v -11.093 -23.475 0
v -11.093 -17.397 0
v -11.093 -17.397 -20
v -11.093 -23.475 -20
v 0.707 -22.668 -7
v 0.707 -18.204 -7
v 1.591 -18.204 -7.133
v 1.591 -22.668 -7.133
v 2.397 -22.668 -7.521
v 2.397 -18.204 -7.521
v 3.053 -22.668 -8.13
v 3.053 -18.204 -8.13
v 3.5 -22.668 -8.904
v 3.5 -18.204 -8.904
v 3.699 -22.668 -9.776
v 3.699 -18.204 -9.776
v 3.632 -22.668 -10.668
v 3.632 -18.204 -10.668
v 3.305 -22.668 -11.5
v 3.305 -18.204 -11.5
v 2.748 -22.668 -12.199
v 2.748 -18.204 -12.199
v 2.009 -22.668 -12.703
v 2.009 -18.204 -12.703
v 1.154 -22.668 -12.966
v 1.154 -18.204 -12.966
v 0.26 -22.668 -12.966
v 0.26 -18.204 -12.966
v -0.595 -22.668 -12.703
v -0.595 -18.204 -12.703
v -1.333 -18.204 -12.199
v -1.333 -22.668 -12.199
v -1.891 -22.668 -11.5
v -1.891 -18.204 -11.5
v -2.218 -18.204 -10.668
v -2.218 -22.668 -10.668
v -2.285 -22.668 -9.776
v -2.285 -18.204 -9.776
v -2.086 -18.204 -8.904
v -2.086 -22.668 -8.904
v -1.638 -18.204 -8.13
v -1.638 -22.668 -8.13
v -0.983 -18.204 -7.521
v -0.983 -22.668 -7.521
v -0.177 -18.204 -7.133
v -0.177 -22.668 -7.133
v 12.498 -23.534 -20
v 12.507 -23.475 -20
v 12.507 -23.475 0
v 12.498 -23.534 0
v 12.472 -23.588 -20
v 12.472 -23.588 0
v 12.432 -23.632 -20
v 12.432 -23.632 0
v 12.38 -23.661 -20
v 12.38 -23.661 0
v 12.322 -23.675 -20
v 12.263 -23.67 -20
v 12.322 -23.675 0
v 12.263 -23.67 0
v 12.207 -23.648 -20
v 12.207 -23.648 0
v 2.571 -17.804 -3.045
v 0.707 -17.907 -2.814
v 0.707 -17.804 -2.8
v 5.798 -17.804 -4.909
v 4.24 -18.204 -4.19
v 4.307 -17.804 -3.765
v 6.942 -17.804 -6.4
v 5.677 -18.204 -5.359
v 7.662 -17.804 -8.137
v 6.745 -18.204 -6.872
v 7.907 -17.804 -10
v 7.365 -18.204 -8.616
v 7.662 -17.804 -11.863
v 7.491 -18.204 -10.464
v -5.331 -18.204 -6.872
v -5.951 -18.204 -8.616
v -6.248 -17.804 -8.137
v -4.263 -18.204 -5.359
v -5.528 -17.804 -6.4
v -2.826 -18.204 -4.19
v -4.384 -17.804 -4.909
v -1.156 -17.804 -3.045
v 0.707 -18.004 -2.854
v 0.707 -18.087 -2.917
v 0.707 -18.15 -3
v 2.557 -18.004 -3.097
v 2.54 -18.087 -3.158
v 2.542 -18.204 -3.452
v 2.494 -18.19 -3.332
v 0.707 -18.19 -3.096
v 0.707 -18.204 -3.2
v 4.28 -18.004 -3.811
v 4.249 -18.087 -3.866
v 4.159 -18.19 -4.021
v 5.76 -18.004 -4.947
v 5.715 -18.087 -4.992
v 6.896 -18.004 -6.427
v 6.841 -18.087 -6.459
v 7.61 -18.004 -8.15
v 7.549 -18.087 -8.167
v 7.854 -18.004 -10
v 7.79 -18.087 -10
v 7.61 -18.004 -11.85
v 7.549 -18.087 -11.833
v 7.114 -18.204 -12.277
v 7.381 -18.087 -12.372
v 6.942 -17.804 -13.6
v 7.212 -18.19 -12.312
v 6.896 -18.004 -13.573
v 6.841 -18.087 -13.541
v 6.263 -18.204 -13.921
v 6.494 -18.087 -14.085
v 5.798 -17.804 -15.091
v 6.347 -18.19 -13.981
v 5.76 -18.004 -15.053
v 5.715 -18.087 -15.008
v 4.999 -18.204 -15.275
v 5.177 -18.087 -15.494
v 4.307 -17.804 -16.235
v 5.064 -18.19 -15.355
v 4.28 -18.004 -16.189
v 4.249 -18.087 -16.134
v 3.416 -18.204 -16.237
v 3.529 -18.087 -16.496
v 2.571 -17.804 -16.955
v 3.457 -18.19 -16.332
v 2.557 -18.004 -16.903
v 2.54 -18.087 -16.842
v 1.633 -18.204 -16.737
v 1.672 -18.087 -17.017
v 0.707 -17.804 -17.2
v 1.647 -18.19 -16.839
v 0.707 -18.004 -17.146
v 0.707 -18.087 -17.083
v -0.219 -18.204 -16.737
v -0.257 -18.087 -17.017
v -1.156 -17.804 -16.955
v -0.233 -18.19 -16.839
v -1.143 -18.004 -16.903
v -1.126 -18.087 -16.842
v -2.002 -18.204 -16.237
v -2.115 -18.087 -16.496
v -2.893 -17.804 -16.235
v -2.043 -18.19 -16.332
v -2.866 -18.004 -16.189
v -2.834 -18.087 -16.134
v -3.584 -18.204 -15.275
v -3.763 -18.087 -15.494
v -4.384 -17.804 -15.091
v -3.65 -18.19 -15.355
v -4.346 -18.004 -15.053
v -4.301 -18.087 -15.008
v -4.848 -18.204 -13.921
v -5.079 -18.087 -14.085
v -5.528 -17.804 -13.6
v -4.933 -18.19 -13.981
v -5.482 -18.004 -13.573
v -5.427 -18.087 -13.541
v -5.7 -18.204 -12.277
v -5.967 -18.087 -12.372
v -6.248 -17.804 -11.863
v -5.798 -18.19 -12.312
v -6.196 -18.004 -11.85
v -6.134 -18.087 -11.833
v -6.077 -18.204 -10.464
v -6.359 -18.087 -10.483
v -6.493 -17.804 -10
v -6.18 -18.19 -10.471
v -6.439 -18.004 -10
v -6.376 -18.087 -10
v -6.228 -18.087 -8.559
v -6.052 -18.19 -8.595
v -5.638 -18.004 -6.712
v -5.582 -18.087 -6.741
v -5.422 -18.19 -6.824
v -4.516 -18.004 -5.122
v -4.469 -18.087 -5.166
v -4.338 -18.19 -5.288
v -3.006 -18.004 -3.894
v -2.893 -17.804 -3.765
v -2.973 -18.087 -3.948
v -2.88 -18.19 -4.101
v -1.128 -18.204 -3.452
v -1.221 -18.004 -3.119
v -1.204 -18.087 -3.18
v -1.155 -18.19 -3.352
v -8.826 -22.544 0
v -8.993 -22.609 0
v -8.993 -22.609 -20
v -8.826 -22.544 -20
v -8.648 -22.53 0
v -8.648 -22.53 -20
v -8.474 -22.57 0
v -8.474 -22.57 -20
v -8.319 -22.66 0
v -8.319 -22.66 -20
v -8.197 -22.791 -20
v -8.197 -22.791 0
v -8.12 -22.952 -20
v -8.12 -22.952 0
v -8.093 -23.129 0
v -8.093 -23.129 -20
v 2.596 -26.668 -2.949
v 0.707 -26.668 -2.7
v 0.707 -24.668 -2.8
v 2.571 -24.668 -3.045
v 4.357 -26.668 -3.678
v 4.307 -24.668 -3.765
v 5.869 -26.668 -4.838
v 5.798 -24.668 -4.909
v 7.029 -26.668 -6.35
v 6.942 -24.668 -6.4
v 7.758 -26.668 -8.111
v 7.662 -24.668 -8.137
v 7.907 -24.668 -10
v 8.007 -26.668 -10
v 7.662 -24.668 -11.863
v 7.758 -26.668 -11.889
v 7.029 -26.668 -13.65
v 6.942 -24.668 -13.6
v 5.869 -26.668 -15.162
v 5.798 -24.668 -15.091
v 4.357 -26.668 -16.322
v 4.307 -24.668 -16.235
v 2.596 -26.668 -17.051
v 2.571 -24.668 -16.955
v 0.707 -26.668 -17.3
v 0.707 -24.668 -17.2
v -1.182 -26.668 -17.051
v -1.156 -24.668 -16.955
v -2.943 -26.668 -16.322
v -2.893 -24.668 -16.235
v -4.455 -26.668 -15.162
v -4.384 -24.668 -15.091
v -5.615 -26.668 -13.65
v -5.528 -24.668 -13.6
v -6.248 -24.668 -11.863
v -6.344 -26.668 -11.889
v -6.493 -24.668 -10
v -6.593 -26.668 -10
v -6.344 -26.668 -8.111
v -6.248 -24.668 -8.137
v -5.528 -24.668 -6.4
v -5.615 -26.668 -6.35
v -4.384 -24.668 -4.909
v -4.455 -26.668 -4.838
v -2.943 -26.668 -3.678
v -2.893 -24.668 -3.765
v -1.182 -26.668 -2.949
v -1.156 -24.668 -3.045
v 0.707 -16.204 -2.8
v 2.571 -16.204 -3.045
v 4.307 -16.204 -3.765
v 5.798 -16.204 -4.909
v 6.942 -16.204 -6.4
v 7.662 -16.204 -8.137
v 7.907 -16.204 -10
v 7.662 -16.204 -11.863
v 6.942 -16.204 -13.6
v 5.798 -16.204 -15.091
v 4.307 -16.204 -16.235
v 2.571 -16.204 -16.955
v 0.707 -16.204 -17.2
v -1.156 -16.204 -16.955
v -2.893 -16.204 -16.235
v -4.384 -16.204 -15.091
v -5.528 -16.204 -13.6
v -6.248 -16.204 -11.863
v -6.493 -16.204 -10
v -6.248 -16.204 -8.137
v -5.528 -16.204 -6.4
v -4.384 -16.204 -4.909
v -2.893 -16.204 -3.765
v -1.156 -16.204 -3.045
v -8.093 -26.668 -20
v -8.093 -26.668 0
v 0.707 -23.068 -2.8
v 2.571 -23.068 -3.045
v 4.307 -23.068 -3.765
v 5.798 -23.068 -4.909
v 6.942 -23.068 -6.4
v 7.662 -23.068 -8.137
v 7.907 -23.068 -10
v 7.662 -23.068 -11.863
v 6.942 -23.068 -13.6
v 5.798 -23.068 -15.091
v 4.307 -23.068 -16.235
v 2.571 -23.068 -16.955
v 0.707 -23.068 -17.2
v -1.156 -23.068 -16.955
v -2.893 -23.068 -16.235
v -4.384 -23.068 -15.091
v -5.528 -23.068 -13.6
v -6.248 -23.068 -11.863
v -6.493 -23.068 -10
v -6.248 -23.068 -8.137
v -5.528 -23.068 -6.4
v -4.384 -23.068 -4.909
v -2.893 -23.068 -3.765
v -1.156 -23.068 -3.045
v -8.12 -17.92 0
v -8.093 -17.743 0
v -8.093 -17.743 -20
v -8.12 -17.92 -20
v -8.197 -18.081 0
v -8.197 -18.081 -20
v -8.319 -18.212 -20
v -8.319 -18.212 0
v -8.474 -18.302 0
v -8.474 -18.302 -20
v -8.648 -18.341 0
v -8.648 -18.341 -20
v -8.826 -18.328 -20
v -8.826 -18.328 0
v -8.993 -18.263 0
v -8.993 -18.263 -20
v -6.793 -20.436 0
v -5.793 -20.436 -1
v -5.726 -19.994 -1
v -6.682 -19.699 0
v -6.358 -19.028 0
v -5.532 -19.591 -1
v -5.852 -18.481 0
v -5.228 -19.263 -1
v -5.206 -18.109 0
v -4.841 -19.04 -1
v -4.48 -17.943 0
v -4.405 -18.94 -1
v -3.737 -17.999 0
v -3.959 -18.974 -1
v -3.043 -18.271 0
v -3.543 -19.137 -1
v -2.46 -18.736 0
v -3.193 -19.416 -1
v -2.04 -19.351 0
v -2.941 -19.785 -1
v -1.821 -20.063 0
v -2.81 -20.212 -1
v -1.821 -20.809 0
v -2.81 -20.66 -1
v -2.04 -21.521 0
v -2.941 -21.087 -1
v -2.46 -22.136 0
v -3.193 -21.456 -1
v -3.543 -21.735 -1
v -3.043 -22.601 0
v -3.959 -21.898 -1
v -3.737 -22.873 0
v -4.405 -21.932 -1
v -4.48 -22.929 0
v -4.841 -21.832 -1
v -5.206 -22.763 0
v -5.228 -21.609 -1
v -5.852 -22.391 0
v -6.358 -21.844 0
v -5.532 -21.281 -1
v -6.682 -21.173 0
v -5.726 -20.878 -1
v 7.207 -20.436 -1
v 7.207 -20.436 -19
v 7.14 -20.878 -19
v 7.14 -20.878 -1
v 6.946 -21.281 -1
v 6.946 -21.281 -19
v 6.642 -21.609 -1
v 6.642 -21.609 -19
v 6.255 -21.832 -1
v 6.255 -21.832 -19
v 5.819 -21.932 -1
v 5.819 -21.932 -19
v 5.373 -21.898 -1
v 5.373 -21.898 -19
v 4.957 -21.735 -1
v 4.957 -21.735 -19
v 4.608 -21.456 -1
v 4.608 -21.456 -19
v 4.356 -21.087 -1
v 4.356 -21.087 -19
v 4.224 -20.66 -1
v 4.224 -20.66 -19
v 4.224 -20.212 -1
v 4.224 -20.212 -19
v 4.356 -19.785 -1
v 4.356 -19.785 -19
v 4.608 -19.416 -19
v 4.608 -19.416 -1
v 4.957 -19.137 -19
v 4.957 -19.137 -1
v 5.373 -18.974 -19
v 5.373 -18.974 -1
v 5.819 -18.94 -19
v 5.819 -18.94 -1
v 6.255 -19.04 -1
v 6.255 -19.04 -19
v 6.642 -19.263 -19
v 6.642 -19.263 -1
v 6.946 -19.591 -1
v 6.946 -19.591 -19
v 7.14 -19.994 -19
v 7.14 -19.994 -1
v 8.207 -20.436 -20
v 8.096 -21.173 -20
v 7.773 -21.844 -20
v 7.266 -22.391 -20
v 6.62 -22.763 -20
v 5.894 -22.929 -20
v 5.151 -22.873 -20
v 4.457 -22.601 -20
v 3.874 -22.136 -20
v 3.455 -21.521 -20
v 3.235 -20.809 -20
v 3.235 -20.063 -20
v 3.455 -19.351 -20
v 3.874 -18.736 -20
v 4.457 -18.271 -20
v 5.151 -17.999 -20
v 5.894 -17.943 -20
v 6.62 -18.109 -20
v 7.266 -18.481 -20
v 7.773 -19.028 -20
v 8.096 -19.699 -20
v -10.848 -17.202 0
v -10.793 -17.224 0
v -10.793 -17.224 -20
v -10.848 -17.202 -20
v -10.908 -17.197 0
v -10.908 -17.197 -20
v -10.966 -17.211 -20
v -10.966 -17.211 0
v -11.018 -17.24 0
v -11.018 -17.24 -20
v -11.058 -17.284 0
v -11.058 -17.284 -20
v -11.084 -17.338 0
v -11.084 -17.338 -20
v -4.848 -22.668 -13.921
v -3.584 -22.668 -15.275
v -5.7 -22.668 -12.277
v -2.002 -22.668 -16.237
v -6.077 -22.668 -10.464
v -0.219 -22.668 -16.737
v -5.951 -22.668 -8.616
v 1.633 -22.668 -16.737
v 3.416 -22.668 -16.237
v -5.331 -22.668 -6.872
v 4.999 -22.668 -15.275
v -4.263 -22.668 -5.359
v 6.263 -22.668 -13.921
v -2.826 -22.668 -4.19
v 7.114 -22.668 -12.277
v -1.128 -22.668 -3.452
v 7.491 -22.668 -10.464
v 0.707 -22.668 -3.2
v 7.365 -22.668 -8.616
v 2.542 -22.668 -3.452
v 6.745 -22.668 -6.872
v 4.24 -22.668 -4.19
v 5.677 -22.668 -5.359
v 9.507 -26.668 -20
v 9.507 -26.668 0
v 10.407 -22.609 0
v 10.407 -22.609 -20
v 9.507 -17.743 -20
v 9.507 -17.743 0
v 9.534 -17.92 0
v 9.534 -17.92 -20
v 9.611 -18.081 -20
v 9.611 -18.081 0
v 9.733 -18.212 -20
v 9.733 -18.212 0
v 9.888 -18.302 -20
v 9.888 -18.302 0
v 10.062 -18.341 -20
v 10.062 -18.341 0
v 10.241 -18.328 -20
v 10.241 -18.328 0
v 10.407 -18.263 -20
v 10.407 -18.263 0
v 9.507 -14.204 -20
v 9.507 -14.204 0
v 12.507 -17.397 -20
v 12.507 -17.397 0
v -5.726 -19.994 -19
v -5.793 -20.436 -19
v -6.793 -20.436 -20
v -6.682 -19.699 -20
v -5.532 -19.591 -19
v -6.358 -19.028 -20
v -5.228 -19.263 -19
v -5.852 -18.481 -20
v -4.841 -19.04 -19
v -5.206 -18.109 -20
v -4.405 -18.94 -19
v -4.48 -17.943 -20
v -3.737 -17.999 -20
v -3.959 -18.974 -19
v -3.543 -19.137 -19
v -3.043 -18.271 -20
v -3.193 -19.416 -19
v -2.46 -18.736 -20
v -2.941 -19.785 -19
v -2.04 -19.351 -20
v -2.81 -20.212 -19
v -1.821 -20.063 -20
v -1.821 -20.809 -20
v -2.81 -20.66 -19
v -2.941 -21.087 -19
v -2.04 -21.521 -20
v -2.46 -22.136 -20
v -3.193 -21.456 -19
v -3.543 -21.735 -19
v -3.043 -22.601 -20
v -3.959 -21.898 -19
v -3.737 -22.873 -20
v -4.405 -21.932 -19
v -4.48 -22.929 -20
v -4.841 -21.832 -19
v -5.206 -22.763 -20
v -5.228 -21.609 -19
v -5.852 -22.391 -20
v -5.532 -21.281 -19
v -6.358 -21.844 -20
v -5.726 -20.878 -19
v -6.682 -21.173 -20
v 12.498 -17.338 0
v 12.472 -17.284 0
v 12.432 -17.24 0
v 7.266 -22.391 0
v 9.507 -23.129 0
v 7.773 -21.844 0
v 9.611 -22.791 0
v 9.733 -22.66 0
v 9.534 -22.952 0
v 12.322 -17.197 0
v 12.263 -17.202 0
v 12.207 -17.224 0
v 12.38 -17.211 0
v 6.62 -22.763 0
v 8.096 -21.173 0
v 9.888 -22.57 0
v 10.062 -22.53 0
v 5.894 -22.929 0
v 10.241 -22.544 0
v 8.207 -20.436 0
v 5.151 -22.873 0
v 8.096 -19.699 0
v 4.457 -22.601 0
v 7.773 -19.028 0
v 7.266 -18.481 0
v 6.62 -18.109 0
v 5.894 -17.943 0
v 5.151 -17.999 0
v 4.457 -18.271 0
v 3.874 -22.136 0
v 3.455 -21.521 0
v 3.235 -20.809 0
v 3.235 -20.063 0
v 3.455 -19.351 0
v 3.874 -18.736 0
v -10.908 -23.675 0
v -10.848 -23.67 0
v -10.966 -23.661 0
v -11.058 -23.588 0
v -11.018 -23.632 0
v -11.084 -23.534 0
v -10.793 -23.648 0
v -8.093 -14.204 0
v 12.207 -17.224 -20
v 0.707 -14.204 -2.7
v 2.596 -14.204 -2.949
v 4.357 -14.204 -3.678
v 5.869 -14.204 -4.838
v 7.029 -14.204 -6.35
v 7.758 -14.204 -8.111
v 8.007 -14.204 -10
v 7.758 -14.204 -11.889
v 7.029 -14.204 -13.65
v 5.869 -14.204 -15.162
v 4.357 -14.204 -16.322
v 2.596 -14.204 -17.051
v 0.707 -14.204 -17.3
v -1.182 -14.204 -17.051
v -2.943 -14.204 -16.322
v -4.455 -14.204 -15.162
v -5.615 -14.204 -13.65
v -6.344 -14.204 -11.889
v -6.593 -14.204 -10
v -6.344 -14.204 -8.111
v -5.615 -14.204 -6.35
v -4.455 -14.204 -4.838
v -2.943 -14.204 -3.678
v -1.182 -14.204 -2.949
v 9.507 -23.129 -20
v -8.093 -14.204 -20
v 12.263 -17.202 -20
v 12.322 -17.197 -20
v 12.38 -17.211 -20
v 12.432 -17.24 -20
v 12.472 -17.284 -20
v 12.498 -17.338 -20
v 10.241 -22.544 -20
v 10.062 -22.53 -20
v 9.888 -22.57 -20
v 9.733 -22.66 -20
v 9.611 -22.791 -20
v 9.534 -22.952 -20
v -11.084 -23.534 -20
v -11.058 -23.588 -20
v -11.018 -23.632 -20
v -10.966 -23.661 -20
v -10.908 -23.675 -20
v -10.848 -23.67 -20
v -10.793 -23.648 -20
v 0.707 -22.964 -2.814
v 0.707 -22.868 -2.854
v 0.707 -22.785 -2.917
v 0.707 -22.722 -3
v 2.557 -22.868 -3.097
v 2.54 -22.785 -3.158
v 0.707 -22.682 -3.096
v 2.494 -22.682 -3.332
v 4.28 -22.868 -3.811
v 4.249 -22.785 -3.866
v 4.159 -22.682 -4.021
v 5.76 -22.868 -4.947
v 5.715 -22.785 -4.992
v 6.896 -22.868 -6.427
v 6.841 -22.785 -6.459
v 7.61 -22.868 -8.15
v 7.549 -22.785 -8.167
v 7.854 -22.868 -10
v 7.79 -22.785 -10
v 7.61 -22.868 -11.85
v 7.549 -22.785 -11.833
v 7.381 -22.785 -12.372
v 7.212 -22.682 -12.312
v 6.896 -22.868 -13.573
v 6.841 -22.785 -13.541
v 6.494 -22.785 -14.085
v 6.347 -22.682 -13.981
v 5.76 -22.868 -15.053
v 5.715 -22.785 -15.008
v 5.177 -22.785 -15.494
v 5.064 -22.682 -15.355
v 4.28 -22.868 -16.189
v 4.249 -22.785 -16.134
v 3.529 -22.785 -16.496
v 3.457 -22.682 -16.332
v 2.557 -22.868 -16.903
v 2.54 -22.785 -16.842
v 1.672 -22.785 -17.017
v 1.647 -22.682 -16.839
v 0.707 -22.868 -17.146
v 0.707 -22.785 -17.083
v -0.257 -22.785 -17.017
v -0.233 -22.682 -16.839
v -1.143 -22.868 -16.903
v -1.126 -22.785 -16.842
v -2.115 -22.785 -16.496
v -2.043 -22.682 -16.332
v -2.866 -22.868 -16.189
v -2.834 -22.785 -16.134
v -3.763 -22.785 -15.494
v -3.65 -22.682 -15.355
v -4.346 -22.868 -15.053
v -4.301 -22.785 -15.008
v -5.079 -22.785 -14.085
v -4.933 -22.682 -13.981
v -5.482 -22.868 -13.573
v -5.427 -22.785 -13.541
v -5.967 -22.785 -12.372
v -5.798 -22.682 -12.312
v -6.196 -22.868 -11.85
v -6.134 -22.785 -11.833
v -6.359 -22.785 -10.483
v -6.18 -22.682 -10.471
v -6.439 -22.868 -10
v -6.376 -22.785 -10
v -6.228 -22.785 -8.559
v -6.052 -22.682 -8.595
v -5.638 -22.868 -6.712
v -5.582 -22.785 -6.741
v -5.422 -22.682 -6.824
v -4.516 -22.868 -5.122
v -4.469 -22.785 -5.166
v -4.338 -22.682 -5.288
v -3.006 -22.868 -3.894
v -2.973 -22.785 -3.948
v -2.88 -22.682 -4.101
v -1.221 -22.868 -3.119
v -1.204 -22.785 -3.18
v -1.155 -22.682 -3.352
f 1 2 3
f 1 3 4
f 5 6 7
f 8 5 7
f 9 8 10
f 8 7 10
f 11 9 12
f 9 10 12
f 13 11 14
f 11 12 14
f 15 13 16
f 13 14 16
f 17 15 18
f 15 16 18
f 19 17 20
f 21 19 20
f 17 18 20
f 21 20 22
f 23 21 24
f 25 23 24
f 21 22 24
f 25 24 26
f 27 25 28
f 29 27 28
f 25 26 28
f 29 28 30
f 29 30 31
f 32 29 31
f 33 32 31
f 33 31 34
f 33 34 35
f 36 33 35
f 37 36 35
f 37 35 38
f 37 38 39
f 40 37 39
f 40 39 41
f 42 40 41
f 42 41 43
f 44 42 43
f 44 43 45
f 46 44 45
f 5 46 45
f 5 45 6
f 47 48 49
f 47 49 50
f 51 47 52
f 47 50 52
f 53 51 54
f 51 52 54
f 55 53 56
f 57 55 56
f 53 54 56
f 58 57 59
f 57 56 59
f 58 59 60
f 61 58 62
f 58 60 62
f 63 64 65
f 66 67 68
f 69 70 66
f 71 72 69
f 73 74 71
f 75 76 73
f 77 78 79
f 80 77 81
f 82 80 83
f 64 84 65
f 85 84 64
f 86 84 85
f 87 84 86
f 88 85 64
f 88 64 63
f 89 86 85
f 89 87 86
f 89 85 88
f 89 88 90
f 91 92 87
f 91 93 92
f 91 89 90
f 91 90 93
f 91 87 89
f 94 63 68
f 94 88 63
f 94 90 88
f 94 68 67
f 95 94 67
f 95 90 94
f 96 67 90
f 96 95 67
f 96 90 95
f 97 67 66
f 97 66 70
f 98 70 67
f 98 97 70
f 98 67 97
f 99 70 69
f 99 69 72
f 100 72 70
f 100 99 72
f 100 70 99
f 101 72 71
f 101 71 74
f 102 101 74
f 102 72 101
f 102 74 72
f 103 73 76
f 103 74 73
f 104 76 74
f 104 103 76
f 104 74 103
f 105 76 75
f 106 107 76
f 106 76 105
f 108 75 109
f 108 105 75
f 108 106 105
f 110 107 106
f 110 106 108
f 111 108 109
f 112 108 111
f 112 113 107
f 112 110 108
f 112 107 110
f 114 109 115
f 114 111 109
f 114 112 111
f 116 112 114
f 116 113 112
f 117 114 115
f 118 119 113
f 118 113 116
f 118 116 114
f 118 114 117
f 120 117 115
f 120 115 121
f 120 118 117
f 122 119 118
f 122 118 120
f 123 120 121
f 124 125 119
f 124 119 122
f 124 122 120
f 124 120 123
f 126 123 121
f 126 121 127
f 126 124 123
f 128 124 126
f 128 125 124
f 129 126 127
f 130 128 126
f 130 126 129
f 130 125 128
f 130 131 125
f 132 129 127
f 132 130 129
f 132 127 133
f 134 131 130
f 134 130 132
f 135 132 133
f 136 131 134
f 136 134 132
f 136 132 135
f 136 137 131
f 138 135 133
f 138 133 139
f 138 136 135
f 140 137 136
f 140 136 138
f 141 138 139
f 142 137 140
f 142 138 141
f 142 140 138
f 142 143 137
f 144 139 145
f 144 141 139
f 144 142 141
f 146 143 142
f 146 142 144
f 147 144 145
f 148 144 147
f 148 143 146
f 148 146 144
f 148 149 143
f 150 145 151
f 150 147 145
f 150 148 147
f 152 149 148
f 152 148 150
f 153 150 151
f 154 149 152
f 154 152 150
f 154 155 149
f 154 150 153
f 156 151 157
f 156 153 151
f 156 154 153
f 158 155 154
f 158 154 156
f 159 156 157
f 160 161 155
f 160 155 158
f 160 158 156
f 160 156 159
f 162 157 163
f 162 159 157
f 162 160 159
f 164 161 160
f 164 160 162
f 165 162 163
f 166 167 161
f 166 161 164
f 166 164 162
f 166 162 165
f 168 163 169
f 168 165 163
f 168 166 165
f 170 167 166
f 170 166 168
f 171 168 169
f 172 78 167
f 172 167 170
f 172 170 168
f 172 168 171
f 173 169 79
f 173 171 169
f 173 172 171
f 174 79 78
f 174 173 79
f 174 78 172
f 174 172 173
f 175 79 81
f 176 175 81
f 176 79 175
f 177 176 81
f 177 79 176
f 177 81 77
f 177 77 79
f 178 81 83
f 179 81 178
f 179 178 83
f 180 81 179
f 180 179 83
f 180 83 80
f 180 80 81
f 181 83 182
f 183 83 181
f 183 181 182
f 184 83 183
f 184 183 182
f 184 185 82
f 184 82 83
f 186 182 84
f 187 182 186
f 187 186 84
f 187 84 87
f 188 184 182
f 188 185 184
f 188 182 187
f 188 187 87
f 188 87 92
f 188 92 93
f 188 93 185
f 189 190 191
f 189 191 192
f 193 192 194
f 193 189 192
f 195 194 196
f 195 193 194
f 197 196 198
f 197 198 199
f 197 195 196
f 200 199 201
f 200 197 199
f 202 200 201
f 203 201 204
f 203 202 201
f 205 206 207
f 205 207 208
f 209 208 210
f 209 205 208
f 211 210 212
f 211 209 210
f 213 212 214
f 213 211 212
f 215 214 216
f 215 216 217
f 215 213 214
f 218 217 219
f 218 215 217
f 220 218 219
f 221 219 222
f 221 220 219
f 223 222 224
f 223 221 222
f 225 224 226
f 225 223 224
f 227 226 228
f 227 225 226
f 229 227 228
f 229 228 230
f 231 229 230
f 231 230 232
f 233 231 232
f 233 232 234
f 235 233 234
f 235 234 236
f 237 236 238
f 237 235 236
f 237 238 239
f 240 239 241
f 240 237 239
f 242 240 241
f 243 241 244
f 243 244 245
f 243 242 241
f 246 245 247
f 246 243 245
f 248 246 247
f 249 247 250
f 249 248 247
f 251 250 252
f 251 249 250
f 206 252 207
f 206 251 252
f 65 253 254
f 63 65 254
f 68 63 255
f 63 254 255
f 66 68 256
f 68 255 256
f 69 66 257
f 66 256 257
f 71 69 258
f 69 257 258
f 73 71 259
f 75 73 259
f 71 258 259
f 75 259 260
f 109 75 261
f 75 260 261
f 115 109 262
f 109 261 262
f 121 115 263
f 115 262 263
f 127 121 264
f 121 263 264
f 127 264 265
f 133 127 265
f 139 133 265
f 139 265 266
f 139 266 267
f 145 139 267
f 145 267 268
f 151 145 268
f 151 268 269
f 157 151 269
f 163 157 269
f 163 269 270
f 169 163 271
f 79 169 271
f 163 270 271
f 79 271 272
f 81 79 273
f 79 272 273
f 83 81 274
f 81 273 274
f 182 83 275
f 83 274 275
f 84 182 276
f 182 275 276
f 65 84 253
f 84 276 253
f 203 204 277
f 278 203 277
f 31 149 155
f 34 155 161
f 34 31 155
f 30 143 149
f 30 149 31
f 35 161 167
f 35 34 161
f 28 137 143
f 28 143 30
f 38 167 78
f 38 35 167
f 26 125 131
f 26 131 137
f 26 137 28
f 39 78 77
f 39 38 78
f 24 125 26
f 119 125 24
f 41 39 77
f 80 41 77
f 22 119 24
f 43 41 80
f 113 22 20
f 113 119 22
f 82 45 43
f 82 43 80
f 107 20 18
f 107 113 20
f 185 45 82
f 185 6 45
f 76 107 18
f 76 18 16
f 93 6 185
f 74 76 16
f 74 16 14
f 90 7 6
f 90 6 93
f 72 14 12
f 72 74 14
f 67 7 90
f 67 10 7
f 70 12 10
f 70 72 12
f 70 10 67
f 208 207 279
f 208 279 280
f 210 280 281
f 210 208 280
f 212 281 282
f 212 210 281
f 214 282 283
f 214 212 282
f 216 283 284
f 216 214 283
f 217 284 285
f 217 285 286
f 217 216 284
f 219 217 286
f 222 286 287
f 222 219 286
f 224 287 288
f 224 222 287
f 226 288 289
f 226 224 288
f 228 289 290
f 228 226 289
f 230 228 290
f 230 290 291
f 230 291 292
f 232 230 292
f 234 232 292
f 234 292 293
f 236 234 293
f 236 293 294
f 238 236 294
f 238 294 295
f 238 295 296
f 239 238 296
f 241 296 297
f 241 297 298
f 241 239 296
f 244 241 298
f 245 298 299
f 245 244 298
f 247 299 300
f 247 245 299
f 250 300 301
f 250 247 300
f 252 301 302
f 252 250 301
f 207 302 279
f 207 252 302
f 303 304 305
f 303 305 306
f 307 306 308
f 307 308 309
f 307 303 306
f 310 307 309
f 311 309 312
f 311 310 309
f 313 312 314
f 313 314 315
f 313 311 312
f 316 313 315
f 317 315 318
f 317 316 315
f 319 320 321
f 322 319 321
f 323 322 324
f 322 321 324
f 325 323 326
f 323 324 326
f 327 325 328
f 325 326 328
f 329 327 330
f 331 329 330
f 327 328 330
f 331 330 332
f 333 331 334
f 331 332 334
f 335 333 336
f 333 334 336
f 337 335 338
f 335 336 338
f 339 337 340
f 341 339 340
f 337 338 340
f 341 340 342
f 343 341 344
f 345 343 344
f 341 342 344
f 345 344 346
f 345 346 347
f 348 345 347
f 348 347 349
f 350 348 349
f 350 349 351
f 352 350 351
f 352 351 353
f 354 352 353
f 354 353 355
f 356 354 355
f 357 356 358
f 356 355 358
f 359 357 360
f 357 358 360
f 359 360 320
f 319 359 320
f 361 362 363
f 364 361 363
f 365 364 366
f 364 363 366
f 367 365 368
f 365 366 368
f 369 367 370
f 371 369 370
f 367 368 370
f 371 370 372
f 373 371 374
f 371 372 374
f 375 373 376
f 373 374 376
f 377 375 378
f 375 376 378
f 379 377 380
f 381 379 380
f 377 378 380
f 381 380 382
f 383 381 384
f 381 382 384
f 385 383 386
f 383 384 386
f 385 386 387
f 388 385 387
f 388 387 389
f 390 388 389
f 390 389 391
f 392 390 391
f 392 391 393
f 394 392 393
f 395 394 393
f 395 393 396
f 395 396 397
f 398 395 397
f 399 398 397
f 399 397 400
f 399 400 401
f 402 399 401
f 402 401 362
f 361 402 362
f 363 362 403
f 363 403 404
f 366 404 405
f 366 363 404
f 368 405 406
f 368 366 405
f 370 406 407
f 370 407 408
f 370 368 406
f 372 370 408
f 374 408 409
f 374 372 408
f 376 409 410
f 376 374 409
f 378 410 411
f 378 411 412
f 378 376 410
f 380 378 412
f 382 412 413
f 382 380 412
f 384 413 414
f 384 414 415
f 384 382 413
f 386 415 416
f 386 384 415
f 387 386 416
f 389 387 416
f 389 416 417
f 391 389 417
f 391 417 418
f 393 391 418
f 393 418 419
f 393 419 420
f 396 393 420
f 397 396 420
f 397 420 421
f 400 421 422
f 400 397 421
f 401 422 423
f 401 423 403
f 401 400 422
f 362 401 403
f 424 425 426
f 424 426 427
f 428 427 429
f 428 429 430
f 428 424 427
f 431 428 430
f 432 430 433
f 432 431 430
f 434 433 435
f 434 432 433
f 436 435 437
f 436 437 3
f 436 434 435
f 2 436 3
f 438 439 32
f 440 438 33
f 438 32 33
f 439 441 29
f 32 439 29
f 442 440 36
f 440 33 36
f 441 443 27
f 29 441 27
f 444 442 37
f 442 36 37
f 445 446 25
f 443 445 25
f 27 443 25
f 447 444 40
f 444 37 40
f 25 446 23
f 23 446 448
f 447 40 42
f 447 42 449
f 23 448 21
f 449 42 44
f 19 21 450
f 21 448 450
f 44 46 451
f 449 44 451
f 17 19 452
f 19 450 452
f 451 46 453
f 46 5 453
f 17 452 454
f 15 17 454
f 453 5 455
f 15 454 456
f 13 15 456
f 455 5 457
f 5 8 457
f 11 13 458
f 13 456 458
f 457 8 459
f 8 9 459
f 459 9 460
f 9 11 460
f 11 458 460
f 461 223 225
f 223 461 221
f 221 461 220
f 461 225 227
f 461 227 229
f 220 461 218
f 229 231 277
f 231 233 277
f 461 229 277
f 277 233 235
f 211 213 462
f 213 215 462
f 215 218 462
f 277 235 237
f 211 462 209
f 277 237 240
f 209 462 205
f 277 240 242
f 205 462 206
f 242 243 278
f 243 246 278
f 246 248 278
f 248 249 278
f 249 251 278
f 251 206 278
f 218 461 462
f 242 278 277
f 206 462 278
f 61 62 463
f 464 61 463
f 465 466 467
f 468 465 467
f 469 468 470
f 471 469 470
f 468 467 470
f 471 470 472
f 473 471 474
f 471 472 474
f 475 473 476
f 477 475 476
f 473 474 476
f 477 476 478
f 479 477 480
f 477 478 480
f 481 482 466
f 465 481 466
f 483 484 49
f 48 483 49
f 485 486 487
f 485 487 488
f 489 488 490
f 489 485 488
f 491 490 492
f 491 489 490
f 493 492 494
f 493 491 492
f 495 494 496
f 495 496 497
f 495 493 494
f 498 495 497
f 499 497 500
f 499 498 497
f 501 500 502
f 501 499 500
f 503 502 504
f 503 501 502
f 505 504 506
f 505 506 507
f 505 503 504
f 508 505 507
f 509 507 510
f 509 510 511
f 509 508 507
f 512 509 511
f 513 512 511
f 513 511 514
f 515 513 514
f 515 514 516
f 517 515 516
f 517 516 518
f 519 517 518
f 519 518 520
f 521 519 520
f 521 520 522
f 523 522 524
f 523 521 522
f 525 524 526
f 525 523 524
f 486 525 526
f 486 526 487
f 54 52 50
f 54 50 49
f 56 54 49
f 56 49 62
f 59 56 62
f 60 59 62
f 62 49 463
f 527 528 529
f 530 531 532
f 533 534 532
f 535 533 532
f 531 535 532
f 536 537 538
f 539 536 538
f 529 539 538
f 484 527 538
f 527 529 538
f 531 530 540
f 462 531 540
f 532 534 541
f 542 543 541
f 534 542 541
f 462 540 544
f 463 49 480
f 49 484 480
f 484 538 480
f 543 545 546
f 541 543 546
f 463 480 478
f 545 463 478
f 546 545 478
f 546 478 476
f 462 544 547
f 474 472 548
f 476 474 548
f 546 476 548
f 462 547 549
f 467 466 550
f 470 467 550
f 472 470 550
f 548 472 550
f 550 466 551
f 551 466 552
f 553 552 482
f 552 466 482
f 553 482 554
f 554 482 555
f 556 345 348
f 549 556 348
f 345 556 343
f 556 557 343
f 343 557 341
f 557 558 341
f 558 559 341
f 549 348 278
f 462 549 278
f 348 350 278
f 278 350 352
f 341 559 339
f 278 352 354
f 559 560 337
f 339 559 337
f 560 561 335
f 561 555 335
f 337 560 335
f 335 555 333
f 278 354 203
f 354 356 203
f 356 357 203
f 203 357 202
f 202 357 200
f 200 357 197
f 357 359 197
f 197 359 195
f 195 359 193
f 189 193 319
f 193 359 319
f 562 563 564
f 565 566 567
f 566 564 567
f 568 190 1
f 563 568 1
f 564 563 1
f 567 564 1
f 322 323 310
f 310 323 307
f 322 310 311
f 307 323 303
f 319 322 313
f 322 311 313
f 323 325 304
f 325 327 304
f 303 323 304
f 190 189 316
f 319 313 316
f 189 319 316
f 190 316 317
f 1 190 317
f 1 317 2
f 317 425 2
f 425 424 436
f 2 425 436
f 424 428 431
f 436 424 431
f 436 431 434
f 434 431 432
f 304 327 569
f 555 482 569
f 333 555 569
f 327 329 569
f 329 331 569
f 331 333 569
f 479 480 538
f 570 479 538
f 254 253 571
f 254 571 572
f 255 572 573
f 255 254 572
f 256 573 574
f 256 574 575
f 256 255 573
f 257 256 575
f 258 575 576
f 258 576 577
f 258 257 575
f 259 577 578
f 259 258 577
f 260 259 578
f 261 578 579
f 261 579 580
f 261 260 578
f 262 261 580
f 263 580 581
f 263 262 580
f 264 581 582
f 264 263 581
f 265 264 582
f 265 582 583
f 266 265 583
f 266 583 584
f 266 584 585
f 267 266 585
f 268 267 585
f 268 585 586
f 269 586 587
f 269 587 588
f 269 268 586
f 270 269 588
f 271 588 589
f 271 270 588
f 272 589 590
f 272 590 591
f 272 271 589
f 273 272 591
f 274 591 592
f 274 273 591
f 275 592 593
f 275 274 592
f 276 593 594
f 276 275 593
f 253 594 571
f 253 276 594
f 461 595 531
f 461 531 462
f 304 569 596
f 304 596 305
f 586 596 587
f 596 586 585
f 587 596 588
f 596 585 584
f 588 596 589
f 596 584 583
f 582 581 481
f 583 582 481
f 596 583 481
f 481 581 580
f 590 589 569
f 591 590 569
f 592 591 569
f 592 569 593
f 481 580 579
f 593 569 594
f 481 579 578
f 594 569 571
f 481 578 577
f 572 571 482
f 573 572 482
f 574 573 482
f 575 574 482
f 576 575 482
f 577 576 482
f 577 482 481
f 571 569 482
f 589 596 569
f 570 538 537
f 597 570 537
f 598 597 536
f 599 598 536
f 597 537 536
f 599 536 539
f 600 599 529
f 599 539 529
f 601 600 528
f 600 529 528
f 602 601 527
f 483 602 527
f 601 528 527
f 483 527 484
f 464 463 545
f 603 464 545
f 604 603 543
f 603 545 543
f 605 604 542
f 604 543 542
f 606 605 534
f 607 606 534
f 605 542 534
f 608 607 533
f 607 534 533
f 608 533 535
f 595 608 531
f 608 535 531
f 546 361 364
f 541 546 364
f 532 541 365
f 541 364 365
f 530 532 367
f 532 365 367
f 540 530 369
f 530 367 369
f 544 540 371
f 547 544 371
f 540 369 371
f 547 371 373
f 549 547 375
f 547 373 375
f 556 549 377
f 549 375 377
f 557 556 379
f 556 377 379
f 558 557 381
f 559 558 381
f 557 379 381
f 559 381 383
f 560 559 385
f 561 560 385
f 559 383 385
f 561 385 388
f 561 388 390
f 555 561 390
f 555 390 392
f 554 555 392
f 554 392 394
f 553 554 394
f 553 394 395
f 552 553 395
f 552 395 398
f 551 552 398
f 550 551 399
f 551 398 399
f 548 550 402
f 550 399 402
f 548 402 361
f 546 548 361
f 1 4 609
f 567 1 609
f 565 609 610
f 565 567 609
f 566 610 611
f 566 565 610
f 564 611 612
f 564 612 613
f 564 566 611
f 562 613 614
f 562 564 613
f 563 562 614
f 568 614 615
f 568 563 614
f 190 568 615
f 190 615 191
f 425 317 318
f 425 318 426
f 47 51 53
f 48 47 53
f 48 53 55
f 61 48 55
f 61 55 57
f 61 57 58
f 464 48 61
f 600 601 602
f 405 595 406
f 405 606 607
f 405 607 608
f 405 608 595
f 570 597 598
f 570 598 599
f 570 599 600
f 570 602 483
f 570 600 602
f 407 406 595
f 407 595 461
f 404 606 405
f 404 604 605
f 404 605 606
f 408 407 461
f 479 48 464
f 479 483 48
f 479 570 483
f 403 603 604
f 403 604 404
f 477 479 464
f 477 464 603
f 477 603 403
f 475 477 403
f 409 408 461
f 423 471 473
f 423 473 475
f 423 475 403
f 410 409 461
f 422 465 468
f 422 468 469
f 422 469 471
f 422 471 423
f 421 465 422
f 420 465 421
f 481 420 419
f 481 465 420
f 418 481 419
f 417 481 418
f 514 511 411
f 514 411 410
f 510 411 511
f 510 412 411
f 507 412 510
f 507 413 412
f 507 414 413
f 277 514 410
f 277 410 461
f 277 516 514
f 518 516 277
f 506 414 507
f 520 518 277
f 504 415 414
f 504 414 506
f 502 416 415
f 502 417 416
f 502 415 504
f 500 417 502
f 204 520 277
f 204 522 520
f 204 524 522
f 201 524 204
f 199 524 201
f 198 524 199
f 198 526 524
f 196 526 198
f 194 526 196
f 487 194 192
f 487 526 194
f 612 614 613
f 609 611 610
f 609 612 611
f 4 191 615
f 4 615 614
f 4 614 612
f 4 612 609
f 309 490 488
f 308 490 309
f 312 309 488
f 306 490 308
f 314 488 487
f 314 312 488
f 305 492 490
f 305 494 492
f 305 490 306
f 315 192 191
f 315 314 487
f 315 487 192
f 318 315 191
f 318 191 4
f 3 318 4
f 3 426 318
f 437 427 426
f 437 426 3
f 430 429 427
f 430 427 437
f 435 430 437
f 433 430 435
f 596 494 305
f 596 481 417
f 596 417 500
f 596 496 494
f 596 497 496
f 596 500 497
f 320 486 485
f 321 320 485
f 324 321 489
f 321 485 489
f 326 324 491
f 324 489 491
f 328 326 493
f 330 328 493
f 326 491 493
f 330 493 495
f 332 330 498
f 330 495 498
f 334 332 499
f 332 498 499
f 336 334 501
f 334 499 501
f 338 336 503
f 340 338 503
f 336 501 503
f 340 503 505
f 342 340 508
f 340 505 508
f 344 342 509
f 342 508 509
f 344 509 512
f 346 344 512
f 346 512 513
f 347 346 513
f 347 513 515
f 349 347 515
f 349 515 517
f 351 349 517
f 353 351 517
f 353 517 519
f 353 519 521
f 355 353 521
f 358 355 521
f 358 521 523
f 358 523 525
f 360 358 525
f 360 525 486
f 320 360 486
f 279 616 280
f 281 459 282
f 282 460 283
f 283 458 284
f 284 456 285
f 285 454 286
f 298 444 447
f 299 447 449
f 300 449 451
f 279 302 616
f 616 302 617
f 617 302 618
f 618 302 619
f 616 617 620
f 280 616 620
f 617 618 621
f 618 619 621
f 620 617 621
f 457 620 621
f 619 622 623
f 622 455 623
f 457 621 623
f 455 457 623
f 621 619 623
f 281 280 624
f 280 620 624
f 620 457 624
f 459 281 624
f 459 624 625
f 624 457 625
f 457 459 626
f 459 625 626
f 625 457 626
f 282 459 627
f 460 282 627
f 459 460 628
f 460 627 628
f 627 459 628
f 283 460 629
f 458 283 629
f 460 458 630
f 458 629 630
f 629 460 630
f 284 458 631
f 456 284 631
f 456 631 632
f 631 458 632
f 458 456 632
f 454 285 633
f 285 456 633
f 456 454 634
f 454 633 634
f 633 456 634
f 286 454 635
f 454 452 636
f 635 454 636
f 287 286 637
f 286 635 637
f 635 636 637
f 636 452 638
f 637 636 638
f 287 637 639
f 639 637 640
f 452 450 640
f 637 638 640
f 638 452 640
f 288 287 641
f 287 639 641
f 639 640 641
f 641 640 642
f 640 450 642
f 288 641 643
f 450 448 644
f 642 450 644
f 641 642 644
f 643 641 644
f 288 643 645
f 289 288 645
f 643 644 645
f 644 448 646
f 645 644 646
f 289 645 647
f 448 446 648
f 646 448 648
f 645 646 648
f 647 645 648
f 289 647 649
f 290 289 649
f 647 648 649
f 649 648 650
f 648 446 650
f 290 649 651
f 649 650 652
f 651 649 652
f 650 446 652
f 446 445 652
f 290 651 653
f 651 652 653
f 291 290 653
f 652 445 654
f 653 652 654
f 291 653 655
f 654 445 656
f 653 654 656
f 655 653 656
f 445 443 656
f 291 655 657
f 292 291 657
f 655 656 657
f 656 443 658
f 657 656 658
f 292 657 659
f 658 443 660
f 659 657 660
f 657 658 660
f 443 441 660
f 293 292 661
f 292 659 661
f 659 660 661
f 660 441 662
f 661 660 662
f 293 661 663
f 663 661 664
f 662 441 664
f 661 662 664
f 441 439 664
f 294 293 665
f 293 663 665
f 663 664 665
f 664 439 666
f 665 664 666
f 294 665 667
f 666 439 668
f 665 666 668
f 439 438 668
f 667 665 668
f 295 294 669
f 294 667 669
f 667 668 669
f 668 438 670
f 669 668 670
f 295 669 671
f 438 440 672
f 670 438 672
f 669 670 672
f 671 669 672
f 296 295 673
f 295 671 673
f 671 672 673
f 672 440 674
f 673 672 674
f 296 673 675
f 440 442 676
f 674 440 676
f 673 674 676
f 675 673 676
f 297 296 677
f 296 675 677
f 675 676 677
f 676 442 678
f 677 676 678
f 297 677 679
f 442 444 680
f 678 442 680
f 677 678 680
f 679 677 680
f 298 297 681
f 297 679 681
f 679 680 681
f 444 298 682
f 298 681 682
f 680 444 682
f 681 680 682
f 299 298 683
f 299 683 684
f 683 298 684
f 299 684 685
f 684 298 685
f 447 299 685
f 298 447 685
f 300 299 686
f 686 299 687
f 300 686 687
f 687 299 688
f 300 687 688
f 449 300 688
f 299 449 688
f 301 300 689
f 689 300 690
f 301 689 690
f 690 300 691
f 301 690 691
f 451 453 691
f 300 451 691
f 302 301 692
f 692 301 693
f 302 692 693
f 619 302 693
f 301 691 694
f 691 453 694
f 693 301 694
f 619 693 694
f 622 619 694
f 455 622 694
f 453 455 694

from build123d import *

# Parameters (mm, degrees)
BOSS_EXTRUDE1_DEPTH = 20
SKETCH2_R           = 7.2
CUT_EXTRUDE1_DEPTH  = 4
SKETCH3_R           = 3
CUT_EXTRUDE2_DEPTH  = 26.061299571
SKETCH4_R           = 1.5
CUT_EXTRUDE3_DEPTH  = 36.603512784
CHAMFER1_SIZE       = 1
FILLET1_R           = 0.4
CHAMFER2_SIZE       = 0.1
CHAMFER2_SIZE2      = 2
CHAMFER3_SIZE       = 2
CHAMFER3_SIZE2      = 0.1


with BuildPart() as part:
    # Sketch1 → Boss-Extrude1 (new body)
    with BuildSketch(Plane.XY):
        with BuildLine():
            Line((-8.092893219, -26.668003347), (0.707106781, -26.668003347))
            Line((0.707106781, -26.668003347), (0.707106781, -14.203901732))
            Line((0.707106781, -14.203901732), (-8.092893219, -14.203901732))
            Line((-8.092893219, -14.203901732), (-8.092893219, -17.743132217))
            ThreePointArc((-8.092893219, -17.743132217), (-8.392893219, -18.262747459), (-8.992893219, -18.262747459))
            Line((-8.992893219, -18.262747459), (-10.792893219, -17.223516975))
            ThreePointArc((-10.792893219, -17.223516975), (-10.992893219, -17.223516975), (-11.092893219, -17.396722055))
            Line((-11.092893219, -17.396722055), (-11.092893219, -23.475183024))
            ThreePointArc((-11.092893219, -23.475183024), (-10.992893219, -23.648388105), (-10.792893219, -23.648388105))
            Line((-10.792893219, -23.648388105), (-8.992893219, -22.609157621))
            ThreePointArc((-8.992893219, -22.609157621), (-8.392893219, -22.609157621), (-8.092893219, -23.128772863))
            Line((-8.092893219, -23.128772863), (-8.092893219, -26.668003347))
        make_face()
    extrude(amount=-BOSS_EXTRUDE1_DEPTH)

    # Mirror1: part across plane


with BuildPart() as part_1:
    add(part.part)
    add(part.part.mirror(Plane(origin=(0.707106781, -26.668003347, -20), x_dir=(0, 0, 1), z_dir=(1, 0, 0))))

    # Sketch2 → Cut-Extrude1 (cut)
    with BuildSketch(Plane(origin=(0, -14.203901732, 0), x_dir=(1, 0, 0), z_dir=(0, 1, 0))):
        with Locations(Location((0.707106781, 10, 0), (0, 0, 270))):
            Circle(SKETCH2_R)
    cut_extrude1 = extrude(amount=-CUT_EXTRUDE1_DEPTH, mode=Mode.SUBTRACT)

    # Mirror2: Cut-Extrude1 across plane
    add(cut_extrude1.mirror(Plane(origin=(0, -20.43595254, 0), x_dir=(0, 0, 1), z_dir=(0, -1, 0))), mode=Mode.SUBTRACT)

    # Sketch3 → Cut-Extrude2 (cut, through all)
    with BuildSketch(Plane(origin=(0, -18.203901732, 0), x_dir=(1, 0, 0), z_dir=(0, 1, 0))):
        with Locations(Location((0.707106781, 10, 0), (0, 0, 270))):
            Circle(SKETCH3_R)
    extrude(amount=-CUT_EXTRUDE2_DEPTH, mode=Mode.SUBTRACT)

    # Sketch4 → Cut-Extrude3 (cut, through all)
    with BuildSketch(Plane(origin=(0, 0, -20), x_dir=(-1, 0, 0), z_dir=(0, 0, -1))):
        with Locations((4.292893219, -20.43595254)):
            Circle(SKETCH4_R)
        with Locations(Location((-5.707106781, -20.43595254, 0), (0, 0, 180))):
            Circle(SKETCH4_R)
    extrude(amount=-CUT_EXTRUDE3_DEPTH, mode=Mode.SUBTRACT)

    # Chamfer1
    chamfer1_edges = [part_1.edges().sort_by_distance(p)[0] for p in [
        (-2.792893219, -20.43595254, 0),
        (-2.792893219, -20.43595254, -20),
        (4.207106781, -20.43595254, 0),
        (4.207106781, -20.43595254, -20),
    ]]
    chamfer(chamfer1_edges, length=CHAMFER1_SIZE)

    # Fillet1
    fillet1_edges = [part_1.edges().sort_by_distance(p)[0] for p in [
        (0.707106781, -18.203901732, -17.2),
        (0.707106781, -22.668003347, -17.2),
    ]]
    fillet(fillet1_edges, radius=FILLET1_R)

    # Chamfer2
    chamfer2_edges = [part_1.edges().sort_by_distance(p)[0] for p in [
        (0.707106781, -14.203901732, -17.2),
    ]]
    chamfer2_side = [part_1.faces().sort_by_distance(p)[0] for p in [
        (-7.826480006, -14.203901732, -10),
    ]]
    chamfer(chamfer2_edges, length=CHAMFER2_SIZE, length2=CHAMFER2_SIZE2, reference=chamfer2_side[0])

    # Chamfer3
    chamfer3_edges = [part_1.edges().sort_by_distance(p)[0] for p in [
        (0.707106781, -26.668003347, -17.2),
    ]]
    chamfer3_side = [part_1.faces().sort_by_distance(p)[0] for p in [
        (0.707106781, -24.868003347, -17.2),
    ]]
    chamfer(chamfer3_edges, length=CHAMFER3_SIZE, length2=CHAMFER3_SIZE2, reference=chamfer3_side[0])


solid = part_1.part
